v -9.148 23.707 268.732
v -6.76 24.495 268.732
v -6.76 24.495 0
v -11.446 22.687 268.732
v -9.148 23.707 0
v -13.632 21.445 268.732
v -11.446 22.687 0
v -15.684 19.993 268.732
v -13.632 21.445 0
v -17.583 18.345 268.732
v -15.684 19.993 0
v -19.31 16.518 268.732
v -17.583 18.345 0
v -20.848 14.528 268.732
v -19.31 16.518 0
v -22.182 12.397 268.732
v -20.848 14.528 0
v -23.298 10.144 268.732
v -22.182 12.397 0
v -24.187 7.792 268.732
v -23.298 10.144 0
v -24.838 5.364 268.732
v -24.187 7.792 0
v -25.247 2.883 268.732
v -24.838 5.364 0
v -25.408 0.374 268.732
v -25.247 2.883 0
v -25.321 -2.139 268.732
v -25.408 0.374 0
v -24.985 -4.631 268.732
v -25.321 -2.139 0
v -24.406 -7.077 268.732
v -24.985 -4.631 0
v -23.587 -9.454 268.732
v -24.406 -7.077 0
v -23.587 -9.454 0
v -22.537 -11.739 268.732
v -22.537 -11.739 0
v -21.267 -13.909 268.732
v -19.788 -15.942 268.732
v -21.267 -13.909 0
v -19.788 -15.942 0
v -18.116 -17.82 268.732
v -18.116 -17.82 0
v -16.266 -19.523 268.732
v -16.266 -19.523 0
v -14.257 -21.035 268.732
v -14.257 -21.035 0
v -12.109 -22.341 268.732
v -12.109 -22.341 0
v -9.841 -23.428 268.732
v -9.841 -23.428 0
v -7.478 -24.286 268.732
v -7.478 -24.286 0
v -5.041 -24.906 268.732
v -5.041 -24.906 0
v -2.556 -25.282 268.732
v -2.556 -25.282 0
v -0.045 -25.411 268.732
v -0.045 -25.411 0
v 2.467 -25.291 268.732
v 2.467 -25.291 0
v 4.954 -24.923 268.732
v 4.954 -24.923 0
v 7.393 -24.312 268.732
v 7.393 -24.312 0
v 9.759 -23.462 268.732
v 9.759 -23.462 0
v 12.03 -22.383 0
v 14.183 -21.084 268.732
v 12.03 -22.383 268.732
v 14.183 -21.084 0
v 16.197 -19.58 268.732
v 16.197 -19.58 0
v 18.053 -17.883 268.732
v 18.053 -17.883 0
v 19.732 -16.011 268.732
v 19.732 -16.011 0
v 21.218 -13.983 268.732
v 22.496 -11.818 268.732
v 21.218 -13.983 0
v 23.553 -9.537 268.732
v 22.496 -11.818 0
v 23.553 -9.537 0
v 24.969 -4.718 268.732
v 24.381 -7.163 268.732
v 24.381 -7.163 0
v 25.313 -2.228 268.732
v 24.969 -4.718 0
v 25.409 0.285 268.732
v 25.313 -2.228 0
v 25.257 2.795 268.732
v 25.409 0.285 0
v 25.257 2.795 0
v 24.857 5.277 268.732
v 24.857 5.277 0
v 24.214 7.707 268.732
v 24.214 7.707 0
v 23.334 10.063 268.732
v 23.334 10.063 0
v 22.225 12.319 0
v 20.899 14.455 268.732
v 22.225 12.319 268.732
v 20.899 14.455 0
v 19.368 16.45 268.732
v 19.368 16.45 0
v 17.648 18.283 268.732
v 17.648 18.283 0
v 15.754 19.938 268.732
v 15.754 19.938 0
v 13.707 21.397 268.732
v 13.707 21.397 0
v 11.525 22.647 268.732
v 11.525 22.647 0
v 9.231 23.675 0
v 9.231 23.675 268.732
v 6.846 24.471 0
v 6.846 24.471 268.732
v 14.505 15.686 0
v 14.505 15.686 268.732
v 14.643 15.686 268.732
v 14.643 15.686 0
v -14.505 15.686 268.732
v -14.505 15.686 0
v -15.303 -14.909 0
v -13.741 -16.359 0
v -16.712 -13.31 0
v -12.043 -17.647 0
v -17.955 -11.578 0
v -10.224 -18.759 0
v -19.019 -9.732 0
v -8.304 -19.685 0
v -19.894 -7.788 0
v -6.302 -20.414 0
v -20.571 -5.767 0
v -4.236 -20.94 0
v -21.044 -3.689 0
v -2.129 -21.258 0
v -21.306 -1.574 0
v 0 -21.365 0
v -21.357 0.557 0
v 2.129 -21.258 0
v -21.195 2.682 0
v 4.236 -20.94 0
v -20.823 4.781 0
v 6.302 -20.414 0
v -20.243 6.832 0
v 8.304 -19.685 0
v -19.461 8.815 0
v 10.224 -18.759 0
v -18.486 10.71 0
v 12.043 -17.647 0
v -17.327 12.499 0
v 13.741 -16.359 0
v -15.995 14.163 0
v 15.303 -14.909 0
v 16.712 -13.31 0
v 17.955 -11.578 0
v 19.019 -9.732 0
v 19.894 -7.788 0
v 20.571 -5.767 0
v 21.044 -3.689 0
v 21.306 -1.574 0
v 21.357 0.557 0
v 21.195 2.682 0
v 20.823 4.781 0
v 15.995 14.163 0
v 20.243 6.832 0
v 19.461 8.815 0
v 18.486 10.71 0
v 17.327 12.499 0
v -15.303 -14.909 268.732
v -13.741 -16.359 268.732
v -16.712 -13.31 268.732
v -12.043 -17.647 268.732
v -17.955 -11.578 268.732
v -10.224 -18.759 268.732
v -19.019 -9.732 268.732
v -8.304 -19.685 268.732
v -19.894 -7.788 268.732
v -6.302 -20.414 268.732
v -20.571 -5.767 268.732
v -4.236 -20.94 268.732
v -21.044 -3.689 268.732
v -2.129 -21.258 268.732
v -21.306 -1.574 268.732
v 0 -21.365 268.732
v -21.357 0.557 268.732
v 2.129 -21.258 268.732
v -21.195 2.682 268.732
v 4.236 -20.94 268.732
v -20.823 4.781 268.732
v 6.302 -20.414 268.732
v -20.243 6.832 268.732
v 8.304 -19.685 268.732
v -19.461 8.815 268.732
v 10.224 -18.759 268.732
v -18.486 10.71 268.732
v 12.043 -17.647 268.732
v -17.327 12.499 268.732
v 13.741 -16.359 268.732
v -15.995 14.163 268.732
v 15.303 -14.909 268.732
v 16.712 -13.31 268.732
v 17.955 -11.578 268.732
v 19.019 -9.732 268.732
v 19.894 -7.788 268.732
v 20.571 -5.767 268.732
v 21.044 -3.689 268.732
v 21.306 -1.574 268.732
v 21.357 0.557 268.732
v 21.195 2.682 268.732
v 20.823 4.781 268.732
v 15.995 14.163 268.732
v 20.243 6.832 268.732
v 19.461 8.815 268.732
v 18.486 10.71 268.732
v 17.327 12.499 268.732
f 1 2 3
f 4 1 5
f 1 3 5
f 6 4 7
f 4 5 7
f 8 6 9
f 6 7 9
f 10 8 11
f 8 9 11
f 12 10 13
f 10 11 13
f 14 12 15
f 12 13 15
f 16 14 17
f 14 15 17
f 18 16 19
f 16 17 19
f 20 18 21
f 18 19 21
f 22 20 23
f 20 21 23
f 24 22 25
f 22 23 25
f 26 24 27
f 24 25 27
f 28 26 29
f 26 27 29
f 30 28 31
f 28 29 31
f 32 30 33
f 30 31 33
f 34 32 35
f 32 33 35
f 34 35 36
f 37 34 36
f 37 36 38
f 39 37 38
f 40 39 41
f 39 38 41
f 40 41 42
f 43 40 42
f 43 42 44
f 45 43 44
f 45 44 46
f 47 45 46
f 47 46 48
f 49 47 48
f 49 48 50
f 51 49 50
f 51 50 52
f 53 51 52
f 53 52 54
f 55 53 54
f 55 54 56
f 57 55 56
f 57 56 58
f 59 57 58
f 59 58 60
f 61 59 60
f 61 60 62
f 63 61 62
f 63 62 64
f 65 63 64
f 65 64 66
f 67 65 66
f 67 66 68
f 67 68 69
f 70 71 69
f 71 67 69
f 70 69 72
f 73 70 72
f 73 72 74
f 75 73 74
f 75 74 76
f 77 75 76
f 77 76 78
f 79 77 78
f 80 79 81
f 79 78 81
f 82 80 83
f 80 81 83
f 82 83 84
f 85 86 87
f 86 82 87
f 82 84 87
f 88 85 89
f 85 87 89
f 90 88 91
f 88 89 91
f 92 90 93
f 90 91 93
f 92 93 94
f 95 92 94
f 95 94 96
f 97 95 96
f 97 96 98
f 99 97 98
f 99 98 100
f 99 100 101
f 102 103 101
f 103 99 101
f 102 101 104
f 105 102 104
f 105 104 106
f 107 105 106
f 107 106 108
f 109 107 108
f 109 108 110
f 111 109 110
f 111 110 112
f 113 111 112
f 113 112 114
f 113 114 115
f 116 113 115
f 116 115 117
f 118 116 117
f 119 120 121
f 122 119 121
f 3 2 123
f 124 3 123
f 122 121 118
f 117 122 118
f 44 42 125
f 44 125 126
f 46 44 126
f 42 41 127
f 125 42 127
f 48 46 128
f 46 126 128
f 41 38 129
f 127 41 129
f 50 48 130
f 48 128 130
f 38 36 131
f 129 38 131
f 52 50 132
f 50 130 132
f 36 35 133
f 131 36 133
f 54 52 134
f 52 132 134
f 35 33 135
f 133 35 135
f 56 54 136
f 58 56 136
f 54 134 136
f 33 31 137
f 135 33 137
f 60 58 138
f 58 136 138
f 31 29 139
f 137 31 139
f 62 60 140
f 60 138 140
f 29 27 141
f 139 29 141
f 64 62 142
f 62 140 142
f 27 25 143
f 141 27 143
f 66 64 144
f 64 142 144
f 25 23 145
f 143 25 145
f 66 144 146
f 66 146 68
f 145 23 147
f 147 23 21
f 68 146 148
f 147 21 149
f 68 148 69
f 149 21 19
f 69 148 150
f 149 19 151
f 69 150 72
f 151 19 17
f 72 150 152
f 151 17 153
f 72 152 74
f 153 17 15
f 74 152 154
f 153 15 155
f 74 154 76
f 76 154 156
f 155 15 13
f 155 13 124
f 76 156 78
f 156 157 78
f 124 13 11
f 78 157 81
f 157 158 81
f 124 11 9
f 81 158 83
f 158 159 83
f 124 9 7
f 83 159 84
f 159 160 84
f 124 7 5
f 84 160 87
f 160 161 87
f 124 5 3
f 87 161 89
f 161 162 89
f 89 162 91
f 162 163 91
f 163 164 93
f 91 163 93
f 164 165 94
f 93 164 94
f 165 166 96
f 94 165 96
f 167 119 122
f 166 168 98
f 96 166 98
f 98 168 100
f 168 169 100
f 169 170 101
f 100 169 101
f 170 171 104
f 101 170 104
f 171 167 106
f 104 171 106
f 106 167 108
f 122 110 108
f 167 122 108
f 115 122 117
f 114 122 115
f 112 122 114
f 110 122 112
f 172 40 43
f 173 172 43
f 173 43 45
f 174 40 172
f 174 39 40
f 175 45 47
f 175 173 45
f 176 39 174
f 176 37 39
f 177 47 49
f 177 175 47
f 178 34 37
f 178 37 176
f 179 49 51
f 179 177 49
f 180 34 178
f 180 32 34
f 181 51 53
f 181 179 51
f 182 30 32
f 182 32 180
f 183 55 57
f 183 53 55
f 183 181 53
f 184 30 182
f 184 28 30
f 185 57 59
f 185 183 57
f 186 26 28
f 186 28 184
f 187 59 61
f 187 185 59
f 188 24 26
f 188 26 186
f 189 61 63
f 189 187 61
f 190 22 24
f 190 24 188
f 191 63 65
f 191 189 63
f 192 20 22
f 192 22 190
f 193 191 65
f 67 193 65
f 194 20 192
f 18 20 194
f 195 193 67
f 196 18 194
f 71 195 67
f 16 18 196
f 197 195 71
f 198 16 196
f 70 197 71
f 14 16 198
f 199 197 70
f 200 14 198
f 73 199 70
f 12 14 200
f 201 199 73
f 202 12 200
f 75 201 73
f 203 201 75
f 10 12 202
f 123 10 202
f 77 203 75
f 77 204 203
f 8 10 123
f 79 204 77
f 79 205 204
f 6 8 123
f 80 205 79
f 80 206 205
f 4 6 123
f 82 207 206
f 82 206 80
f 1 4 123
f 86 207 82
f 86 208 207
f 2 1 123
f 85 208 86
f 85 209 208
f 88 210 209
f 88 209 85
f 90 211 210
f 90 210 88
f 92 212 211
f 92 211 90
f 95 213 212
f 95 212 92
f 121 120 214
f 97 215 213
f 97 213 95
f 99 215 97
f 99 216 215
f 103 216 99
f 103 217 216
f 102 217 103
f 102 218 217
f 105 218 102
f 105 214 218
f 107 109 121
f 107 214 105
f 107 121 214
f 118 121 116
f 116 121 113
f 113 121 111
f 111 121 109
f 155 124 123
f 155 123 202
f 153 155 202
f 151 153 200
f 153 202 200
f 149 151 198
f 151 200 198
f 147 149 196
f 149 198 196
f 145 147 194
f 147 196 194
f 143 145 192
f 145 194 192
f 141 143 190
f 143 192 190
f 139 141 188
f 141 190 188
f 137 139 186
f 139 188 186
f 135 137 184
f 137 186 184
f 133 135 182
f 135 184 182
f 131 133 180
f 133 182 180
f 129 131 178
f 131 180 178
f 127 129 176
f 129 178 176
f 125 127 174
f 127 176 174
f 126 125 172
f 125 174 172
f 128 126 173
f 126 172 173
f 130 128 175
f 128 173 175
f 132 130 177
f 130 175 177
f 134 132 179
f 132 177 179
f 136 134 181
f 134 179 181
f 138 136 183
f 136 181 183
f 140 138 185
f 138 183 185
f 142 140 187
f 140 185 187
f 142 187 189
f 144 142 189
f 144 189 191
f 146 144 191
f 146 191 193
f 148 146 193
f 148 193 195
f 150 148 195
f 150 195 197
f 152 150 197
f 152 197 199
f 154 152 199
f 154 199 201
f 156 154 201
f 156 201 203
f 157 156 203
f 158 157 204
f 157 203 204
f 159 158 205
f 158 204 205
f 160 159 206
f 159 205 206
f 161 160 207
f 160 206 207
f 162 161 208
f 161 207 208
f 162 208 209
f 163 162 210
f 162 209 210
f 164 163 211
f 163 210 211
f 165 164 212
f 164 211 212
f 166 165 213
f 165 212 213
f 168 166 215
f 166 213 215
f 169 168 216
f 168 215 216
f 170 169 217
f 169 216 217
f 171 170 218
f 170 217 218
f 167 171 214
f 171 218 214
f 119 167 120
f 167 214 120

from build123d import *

# Parameters (mm, degrees)
F0_R     = 25.410924
F1_DEPTH = 268.732
F2_R     = 21.364523
F3_DEPTH = 1270
F5_DEPTH = 142240


with BuildPart() as f1:
    # F0 (on Top) → F1 (new body)
    with BuildSketch(Plane.XY):
        Circle(F0_R)
    extrude(amount=F1_DEPTH)

    # F2 (on face) → F3 (cut)
    with BuildSketch(Plane.XY.offset(268.732)):
        Circle(F2_R)
    extrude(amount=-F3_DEPTH, mode=Mode.SUBTRACT)

    # F4 (on face) → F5 (cut)
    with BuildSketch(Plane.XY.offset(268.732)):
        Polygon((0, 32.184474), (-14.504612, 15.68627), (14.643387, 15.68627), align=None)
    extrude(amount=-F5_DEPTH, mode=Mode.SUBTRACT)


solid = f1.part
